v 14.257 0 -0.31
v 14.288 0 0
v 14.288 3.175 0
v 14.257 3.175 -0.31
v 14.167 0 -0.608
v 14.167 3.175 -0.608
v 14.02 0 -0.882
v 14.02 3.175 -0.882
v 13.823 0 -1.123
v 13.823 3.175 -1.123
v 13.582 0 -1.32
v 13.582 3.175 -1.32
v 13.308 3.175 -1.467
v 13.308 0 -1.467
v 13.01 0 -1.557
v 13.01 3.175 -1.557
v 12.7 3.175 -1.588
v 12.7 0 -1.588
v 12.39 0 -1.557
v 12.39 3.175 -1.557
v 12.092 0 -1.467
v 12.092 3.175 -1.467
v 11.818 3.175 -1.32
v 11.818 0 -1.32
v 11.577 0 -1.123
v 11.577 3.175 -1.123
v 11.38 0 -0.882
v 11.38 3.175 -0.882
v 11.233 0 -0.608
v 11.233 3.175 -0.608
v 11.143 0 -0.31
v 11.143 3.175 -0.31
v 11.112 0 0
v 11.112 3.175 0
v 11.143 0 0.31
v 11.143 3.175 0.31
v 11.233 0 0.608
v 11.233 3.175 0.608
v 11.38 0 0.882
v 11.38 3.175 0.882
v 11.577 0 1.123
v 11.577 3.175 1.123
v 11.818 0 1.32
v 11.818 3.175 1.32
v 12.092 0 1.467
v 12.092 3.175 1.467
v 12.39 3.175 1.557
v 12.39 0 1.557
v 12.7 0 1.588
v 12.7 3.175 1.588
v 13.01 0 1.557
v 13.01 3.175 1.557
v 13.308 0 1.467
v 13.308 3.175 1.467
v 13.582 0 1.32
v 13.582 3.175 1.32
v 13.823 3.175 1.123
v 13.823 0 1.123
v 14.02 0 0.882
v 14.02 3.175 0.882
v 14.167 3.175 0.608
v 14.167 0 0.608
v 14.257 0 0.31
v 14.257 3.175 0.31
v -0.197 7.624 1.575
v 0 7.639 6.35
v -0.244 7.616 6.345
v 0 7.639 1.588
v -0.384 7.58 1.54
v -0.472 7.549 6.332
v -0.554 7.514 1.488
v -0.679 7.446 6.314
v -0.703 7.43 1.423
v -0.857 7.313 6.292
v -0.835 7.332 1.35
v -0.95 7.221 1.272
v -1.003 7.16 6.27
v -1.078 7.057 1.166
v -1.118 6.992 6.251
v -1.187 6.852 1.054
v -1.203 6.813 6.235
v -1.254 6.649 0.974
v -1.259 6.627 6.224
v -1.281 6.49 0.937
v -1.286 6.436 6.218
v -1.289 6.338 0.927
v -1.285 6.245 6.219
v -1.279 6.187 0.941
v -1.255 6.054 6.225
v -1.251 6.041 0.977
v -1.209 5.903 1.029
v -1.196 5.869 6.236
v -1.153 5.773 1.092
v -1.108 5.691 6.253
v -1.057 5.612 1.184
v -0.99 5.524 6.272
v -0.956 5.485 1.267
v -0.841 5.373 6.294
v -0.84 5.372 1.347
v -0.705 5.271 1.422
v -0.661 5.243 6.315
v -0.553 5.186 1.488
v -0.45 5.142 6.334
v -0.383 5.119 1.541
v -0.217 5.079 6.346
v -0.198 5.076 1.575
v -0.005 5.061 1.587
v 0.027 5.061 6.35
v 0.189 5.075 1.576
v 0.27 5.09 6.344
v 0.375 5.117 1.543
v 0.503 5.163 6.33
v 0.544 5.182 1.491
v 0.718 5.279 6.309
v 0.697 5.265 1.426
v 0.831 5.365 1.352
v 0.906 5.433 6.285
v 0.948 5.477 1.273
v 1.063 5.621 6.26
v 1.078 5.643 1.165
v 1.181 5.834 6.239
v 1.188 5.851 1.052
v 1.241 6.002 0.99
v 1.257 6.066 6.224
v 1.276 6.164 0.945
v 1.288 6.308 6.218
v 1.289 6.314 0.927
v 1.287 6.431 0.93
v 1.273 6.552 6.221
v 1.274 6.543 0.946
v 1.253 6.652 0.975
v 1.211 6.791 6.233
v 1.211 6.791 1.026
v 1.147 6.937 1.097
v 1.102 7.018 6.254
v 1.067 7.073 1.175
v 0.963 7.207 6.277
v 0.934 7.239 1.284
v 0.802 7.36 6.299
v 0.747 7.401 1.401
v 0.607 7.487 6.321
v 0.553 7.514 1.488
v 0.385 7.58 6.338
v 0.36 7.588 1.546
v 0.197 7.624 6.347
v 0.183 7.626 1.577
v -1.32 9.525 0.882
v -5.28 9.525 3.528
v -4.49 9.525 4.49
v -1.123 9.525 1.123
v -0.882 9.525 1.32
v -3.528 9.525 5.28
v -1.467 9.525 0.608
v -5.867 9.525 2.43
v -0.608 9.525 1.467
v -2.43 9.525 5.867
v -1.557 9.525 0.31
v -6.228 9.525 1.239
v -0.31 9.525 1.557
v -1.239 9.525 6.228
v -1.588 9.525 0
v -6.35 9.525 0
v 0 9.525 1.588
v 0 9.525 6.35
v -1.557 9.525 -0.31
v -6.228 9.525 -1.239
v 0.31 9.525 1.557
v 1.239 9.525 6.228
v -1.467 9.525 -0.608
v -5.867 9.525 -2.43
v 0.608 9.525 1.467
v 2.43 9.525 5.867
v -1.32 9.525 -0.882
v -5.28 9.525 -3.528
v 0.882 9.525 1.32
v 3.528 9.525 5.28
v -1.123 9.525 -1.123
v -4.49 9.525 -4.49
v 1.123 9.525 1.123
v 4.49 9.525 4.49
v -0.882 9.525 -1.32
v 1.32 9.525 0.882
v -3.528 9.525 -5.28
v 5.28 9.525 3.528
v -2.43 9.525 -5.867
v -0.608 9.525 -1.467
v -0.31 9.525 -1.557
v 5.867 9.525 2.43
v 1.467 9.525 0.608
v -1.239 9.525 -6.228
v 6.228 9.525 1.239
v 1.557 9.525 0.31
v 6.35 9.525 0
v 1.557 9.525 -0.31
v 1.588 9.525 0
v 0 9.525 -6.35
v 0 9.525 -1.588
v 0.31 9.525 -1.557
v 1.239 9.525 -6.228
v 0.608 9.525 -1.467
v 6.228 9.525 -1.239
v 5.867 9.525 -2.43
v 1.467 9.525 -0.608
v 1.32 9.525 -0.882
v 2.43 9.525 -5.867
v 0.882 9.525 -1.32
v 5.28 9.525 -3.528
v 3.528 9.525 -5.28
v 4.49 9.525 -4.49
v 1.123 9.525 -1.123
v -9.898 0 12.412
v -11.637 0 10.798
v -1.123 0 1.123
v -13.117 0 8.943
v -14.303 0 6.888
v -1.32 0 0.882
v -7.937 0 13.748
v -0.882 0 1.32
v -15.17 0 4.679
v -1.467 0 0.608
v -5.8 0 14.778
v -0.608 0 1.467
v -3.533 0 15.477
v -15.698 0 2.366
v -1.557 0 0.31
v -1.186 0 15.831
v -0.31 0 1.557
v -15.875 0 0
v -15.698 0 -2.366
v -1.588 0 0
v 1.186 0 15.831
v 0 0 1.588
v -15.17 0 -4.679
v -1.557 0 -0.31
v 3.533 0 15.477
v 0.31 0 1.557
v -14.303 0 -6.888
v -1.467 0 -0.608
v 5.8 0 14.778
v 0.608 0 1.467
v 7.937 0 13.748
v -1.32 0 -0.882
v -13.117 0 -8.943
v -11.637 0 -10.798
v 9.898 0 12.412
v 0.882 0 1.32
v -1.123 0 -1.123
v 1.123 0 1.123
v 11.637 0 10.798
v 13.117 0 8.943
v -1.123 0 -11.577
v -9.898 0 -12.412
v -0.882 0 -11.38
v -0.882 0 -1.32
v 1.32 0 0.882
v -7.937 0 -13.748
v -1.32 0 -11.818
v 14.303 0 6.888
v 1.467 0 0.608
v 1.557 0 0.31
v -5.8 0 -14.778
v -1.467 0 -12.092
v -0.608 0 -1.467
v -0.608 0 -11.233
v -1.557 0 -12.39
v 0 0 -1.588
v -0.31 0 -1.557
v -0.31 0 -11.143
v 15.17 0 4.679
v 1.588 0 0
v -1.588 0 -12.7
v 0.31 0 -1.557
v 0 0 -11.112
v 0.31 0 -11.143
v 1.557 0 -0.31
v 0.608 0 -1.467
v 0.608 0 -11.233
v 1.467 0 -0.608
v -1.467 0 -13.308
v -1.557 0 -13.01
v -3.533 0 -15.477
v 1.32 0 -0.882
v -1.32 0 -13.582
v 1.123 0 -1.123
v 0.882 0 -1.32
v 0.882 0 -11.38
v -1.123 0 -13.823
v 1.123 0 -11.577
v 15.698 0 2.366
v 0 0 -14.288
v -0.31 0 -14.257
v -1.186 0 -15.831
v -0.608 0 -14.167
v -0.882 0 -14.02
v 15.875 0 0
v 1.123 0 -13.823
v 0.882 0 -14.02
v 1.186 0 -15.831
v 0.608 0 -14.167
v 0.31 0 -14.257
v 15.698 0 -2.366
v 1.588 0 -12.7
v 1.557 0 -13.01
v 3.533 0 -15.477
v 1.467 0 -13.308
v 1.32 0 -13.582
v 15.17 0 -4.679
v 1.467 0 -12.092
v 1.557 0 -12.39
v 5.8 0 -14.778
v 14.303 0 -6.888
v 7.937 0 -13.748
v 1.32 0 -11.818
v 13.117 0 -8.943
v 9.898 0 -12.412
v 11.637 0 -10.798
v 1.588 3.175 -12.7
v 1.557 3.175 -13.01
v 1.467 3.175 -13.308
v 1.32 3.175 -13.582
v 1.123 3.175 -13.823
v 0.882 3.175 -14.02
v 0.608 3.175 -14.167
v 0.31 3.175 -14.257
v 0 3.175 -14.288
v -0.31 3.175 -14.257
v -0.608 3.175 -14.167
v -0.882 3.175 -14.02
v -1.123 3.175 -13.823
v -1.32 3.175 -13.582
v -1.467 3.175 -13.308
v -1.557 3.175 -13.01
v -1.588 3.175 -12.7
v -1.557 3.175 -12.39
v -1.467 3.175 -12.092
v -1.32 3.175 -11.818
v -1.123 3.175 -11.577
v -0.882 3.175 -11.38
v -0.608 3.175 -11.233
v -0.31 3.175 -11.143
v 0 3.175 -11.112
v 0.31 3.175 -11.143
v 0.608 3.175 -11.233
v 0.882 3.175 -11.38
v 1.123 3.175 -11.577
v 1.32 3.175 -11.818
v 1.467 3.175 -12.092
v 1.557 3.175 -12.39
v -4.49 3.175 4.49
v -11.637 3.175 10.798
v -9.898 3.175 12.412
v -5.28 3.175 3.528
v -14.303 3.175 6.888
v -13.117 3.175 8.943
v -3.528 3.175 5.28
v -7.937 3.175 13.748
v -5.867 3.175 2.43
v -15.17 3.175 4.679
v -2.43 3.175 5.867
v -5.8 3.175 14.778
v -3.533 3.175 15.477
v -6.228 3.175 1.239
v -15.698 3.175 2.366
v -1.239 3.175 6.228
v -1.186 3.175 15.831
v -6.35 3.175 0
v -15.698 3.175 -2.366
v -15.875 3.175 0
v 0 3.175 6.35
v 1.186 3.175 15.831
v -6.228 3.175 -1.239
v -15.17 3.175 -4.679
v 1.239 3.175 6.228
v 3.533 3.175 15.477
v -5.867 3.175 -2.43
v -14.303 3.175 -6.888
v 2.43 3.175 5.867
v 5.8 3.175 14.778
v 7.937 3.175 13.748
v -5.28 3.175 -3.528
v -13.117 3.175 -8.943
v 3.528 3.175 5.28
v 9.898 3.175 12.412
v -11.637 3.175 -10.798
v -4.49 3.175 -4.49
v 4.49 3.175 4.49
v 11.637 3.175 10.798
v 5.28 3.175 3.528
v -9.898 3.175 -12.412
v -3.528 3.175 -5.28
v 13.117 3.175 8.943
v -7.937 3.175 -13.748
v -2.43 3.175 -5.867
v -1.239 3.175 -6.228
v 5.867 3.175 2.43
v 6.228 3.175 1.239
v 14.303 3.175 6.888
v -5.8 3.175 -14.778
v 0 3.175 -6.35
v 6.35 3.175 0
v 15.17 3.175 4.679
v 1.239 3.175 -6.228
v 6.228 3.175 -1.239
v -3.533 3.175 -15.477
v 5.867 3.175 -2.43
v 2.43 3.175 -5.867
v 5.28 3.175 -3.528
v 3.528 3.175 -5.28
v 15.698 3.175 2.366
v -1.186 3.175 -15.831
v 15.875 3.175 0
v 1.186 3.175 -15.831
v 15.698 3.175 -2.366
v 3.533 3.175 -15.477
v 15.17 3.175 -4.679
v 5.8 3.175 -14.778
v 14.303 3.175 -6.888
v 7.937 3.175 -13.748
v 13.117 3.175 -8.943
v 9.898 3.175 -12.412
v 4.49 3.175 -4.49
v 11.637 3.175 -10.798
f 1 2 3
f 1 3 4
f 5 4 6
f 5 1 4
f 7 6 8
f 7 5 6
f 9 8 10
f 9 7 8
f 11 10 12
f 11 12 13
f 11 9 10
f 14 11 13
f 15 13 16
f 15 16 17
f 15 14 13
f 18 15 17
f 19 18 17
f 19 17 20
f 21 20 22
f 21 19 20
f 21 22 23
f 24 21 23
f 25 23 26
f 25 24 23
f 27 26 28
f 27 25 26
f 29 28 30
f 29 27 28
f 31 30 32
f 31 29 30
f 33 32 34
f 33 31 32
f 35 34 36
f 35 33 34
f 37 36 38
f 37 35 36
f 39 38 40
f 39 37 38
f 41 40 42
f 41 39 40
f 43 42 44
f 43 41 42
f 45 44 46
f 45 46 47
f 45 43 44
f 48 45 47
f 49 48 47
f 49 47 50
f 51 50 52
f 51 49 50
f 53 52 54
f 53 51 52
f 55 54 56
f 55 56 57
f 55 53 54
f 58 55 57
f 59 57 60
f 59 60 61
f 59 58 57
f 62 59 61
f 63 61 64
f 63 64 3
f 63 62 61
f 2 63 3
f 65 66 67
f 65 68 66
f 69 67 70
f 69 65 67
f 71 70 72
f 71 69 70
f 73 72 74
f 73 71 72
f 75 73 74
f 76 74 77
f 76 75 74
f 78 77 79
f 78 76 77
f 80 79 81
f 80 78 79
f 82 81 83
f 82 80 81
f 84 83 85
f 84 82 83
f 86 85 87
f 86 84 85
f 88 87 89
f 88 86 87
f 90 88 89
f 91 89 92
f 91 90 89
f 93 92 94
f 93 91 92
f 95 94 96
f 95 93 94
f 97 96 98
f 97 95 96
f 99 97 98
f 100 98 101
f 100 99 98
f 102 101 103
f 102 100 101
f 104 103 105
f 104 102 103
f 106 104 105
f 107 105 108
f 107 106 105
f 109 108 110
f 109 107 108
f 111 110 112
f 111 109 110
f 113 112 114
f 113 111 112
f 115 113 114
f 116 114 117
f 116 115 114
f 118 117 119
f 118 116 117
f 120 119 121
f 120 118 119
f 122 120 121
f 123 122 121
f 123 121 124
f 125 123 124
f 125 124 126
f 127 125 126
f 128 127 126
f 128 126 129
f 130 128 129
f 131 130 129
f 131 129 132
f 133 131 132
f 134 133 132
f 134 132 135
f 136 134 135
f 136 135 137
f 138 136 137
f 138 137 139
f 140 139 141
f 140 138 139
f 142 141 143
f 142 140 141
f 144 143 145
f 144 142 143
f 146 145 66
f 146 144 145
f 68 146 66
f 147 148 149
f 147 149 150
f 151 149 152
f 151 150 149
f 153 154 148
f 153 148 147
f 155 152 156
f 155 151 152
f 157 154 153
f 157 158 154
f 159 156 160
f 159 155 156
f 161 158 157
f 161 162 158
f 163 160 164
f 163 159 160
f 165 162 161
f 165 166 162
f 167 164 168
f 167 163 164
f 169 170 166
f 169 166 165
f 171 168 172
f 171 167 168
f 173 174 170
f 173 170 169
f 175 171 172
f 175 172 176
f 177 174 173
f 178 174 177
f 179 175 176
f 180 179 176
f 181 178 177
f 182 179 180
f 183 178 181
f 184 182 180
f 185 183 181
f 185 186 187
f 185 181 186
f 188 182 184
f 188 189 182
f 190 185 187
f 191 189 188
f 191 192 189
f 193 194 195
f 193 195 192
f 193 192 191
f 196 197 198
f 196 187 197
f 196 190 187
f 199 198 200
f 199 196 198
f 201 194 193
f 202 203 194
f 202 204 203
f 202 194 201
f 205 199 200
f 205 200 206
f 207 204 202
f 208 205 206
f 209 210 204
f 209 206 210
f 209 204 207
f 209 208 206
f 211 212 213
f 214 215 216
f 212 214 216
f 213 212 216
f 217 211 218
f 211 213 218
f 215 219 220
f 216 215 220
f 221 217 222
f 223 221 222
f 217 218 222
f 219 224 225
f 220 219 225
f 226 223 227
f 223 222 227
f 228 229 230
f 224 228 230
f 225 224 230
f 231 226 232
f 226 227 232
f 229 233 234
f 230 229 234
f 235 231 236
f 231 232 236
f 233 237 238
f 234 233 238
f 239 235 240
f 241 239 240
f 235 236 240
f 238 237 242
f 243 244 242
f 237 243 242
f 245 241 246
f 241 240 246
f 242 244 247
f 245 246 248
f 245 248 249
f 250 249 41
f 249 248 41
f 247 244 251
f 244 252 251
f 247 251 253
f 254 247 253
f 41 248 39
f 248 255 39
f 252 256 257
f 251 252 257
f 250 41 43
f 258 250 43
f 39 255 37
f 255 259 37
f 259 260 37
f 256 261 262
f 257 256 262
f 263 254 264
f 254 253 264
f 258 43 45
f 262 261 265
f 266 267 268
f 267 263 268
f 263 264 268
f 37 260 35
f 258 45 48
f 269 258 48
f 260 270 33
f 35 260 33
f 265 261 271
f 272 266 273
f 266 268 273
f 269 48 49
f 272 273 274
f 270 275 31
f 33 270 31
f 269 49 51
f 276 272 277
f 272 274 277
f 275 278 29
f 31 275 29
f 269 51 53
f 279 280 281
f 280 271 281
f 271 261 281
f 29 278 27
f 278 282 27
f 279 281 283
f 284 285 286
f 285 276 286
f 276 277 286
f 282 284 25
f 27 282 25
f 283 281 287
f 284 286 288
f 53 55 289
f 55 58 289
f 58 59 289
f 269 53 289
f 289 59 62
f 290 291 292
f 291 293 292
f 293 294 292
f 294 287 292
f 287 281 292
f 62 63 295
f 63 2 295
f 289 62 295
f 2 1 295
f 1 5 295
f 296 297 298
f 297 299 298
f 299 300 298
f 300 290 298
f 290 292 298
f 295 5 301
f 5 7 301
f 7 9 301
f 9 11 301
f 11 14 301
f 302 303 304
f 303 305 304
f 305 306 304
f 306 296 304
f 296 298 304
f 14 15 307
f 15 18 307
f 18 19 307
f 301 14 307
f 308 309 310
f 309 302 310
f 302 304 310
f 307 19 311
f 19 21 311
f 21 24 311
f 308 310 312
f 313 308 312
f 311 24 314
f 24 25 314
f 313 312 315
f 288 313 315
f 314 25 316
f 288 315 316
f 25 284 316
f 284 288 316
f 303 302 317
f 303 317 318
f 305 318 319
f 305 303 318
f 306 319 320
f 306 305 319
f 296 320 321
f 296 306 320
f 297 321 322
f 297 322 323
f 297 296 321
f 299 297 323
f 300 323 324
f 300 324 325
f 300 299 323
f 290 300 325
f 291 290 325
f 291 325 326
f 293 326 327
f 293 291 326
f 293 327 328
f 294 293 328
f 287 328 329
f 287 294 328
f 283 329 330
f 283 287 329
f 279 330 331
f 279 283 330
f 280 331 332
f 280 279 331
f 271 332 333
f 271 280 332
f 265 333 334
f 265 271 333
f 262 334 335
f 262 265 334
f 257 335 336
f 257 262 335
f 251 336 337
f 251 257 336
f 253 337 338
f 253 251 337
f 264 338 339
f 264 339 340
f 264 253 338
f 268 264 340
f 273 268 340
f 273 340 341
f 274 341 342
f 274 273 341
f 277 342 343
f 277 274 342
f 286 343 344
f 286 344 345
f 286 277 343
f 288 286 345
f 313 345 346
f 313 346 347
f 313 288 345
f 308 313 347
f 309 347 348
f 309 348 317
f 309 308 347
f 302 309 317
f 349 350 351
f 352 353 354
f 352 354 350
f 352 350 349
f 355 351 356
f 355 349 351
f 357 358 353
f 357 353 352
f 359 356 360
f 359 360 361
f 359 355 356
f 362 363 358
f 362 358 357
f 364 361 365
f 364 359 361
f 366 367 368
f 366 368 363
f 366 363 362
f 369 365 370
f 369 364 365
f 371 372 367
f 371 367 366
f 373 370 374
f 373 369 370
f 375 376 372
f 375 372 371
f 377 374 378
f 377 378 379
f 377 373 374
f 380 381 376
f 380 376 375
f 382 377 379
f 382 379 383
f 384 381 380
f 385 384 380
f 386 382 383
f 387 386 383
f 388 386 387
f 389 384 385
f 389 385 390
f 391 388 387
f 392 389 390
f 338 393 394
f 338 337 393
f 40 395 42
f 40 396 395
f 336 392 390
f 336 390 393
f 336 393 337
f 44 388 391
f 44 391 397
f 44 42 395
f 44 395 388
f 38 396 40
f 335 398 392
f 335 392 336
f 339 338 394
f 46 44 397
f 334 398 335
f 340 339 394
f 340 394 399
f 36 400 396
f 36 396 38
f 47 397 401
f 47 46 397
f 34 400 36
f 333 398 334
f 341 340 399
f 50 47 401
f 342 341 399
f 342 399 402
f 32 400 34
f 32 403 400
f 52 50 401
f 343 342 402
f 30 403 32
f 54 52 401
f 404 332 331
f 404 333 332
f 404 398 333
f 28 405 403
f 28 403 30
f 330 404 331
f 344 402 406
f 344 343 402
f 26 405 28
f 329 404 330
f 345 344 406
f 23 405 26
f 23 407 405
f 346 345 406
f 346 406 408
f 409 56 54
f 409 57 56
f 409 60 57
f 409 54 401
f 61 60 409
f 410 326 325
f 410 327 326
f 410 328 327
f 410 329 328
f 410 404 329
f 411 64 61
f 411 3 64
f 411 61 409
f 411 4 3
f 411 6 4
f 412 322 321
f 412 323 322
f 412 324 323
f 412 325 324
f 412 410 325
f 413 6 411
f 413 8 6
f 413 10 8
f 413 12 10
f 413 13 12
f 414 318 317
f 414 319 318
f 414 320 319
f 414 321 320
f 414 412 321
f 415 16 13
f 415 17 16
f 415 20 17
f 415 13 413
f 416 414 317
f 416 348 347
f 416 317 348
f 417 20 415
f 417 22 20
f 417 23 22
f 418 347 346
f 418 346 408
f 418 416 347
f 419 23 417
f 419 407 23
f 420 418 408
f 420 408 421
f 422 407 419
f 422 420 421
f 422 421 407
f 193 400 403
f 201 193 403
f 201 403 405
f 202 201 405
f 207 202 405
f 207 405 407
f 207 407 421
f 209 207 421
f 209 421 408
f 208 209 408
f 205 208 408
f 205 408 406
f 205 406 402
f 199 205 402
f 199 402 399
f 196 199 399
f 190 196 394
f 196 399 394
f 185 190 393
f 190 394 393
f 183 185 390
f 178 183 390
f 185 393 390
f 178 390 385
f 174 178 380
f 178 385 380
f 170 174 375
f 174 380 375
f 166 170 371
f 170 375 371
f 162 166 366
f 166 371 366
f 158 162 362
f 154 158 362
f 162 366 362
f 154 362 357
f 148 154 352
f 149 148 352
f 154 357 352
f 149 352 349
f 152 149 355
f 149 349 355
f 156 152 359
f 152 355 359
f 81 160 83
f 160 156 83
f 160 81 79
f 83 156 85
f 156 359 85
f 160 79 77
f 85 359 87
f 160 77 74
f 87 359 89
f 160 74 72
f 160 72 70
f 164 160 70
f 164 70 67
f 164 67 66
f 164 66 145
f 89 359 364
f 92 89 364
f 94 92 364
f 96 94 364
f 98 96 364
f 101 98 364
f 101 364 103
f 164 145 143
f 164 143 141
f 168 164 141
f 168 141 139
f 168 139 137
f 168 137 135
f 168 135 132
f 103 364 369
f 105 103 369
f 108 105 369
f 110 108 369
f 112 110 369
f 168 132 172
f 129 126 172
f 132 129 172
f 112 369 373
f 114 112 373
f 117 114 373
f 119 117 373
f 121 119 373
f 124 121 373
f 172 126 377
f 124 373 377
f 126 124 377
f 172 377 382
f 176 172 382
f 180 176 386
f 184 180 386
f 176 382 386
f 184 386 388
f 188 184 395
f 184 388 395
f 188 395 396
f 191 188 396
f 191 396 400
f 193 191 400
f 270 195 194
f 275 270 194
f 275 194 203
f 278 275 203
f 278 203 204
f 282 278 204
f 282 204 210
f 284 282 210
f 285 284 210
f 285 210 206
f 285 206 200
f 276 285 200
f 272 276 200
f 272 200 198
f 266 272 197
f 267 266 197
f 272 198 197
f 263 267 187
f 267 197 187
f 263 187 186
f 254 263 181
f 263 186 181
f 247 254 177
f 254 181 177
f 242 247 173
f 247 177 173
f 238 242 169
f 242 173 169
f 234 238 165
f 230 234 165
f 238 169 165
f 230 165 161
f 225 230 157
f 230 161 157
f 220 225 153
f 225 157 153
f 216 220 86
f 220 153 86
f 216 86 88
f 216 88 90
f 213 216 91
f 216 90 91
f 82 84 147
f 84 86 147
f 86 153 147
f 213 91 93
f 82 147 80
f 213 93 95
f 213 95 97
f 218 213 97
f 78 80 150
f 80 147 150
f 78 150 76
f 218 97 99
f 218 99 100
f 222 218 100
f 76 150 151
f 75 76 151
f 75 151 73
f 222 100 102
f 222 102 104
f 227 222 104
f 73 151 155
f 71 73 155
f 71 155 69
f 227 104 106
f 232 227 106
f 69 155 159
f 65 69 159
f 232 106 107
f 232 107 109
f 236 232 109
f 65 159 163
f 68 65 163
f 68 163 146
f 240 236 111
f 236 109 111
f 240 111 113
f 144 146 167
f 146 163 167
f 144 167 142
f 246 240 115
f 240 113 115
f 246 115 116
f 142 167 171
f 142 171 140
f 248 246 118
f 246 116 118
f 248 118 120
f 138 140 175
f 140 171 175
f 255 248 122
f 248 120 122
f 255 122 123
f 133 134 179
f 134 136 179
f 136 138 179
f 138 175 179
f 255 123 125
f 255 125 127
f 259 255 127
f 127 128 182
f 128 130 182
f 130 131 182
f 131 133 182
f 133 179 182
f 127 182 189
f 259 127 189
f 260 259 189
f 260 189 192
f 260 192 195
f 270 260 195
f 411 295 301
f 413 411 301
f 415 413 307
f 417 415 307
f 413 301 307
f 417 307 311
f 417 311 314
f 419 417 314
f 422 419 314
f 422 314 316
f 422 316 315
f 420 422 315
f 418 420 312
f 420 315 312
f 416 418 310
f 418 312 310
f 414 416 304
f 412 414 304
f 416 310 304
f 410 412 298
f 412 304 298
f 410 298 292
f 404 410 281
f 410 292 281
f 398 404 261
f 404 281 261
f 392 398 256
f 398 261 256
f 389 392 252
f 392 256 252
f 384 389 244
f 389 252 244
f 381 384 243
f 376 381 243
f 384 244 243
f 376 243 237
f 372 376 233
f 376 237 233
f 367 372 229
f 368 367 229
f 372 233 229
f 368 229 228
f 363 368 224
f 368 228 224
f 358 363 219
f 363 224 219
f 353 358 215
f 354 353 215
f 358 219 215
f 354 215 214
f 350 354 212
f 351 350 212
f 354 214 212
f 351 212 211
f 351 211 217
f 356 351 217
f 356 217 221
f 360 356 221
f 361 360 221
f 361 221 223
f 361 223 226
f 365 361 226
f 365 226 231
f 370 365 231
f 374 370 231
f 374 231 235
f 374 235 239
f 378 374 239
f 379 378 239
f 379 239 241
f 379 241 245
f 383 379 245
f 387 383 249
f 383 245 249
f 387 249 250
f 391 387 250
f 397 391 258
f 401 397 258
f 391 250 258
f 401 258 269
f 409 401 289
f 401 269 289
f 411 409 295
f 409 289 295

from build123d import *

# Parameters (mm, degrees)
SKETCH1_R           = 15.875
SKETCH1_R_2         = 1.5875
BOSS_EXTRUDE1_DEPTH = 3.175
SKETCH2_R           = 6.35
BOSS_EXTRUDE2_DEPTH = 6.35
SKETCH3_R           = 1.5875
CUT_EXTRUDE1_DEPTH  = 10.525


with BuildPart() as part:
    # Sketch1 → Boss-Extrude1 (new body)
    with BuildSketch(Plane(origin=(0, 0, 0), x_dir=(1, 0, 0), z_dir=(0, 1, 0))):
        Circle(SKETCH1_R)
        with Locations((0, 12.7)):
            Circle(SKETCH1_R_2, mode=Mode.SUBTRACT)
        with Locations((12.7, 0)):
            Circle(SKETCH1_R_2, mode=Mode.SUBTRACT)
    extrude(amount=BOSS_EXTRUDE1_DEPTH)

    # Sketch2 → Boss-Extrude2 (add)
    with BuildSketch(Plane(origin=(0, 3.175, 0), x_dir=(1, 0, 0), z_dir=(0, 1, 0))):
        Circle(SKETCH2_R)
    extrude(amount=BOSS_EXTRUDE2_DEPTH)

    # Sketch3 → Cut-Extrude1 (cut, through all)
    with BuildSketch(Plane(origin=(0, 9.525, 0), x_dir=(1, 0, 0), z_dir=(0, 1, 0))):
        Circle(SKETCH3_R)
    extrude(amount=-CUT_EXTRUDE1_DEPTH, mode=Mode.SUBTRACT)

    # Sketch5 → #38 (0.1015) Diameter Hole1 (revolve, cut)
    with BuildSketch(Plane(origin=(0, 6.35, 0), x_dir=(0, 1, 0), z_dir=(1, 0, 0))):
        Polygon((0, 0), (0, 26.174539381), (1.28905, 25.4), (1.28905, 0), align=None)
    revolve(axis=Axis((0, 6.35, -6.35), (0, 0, 1)), mode=Mode.SUBTRACT)


solid = part.part
